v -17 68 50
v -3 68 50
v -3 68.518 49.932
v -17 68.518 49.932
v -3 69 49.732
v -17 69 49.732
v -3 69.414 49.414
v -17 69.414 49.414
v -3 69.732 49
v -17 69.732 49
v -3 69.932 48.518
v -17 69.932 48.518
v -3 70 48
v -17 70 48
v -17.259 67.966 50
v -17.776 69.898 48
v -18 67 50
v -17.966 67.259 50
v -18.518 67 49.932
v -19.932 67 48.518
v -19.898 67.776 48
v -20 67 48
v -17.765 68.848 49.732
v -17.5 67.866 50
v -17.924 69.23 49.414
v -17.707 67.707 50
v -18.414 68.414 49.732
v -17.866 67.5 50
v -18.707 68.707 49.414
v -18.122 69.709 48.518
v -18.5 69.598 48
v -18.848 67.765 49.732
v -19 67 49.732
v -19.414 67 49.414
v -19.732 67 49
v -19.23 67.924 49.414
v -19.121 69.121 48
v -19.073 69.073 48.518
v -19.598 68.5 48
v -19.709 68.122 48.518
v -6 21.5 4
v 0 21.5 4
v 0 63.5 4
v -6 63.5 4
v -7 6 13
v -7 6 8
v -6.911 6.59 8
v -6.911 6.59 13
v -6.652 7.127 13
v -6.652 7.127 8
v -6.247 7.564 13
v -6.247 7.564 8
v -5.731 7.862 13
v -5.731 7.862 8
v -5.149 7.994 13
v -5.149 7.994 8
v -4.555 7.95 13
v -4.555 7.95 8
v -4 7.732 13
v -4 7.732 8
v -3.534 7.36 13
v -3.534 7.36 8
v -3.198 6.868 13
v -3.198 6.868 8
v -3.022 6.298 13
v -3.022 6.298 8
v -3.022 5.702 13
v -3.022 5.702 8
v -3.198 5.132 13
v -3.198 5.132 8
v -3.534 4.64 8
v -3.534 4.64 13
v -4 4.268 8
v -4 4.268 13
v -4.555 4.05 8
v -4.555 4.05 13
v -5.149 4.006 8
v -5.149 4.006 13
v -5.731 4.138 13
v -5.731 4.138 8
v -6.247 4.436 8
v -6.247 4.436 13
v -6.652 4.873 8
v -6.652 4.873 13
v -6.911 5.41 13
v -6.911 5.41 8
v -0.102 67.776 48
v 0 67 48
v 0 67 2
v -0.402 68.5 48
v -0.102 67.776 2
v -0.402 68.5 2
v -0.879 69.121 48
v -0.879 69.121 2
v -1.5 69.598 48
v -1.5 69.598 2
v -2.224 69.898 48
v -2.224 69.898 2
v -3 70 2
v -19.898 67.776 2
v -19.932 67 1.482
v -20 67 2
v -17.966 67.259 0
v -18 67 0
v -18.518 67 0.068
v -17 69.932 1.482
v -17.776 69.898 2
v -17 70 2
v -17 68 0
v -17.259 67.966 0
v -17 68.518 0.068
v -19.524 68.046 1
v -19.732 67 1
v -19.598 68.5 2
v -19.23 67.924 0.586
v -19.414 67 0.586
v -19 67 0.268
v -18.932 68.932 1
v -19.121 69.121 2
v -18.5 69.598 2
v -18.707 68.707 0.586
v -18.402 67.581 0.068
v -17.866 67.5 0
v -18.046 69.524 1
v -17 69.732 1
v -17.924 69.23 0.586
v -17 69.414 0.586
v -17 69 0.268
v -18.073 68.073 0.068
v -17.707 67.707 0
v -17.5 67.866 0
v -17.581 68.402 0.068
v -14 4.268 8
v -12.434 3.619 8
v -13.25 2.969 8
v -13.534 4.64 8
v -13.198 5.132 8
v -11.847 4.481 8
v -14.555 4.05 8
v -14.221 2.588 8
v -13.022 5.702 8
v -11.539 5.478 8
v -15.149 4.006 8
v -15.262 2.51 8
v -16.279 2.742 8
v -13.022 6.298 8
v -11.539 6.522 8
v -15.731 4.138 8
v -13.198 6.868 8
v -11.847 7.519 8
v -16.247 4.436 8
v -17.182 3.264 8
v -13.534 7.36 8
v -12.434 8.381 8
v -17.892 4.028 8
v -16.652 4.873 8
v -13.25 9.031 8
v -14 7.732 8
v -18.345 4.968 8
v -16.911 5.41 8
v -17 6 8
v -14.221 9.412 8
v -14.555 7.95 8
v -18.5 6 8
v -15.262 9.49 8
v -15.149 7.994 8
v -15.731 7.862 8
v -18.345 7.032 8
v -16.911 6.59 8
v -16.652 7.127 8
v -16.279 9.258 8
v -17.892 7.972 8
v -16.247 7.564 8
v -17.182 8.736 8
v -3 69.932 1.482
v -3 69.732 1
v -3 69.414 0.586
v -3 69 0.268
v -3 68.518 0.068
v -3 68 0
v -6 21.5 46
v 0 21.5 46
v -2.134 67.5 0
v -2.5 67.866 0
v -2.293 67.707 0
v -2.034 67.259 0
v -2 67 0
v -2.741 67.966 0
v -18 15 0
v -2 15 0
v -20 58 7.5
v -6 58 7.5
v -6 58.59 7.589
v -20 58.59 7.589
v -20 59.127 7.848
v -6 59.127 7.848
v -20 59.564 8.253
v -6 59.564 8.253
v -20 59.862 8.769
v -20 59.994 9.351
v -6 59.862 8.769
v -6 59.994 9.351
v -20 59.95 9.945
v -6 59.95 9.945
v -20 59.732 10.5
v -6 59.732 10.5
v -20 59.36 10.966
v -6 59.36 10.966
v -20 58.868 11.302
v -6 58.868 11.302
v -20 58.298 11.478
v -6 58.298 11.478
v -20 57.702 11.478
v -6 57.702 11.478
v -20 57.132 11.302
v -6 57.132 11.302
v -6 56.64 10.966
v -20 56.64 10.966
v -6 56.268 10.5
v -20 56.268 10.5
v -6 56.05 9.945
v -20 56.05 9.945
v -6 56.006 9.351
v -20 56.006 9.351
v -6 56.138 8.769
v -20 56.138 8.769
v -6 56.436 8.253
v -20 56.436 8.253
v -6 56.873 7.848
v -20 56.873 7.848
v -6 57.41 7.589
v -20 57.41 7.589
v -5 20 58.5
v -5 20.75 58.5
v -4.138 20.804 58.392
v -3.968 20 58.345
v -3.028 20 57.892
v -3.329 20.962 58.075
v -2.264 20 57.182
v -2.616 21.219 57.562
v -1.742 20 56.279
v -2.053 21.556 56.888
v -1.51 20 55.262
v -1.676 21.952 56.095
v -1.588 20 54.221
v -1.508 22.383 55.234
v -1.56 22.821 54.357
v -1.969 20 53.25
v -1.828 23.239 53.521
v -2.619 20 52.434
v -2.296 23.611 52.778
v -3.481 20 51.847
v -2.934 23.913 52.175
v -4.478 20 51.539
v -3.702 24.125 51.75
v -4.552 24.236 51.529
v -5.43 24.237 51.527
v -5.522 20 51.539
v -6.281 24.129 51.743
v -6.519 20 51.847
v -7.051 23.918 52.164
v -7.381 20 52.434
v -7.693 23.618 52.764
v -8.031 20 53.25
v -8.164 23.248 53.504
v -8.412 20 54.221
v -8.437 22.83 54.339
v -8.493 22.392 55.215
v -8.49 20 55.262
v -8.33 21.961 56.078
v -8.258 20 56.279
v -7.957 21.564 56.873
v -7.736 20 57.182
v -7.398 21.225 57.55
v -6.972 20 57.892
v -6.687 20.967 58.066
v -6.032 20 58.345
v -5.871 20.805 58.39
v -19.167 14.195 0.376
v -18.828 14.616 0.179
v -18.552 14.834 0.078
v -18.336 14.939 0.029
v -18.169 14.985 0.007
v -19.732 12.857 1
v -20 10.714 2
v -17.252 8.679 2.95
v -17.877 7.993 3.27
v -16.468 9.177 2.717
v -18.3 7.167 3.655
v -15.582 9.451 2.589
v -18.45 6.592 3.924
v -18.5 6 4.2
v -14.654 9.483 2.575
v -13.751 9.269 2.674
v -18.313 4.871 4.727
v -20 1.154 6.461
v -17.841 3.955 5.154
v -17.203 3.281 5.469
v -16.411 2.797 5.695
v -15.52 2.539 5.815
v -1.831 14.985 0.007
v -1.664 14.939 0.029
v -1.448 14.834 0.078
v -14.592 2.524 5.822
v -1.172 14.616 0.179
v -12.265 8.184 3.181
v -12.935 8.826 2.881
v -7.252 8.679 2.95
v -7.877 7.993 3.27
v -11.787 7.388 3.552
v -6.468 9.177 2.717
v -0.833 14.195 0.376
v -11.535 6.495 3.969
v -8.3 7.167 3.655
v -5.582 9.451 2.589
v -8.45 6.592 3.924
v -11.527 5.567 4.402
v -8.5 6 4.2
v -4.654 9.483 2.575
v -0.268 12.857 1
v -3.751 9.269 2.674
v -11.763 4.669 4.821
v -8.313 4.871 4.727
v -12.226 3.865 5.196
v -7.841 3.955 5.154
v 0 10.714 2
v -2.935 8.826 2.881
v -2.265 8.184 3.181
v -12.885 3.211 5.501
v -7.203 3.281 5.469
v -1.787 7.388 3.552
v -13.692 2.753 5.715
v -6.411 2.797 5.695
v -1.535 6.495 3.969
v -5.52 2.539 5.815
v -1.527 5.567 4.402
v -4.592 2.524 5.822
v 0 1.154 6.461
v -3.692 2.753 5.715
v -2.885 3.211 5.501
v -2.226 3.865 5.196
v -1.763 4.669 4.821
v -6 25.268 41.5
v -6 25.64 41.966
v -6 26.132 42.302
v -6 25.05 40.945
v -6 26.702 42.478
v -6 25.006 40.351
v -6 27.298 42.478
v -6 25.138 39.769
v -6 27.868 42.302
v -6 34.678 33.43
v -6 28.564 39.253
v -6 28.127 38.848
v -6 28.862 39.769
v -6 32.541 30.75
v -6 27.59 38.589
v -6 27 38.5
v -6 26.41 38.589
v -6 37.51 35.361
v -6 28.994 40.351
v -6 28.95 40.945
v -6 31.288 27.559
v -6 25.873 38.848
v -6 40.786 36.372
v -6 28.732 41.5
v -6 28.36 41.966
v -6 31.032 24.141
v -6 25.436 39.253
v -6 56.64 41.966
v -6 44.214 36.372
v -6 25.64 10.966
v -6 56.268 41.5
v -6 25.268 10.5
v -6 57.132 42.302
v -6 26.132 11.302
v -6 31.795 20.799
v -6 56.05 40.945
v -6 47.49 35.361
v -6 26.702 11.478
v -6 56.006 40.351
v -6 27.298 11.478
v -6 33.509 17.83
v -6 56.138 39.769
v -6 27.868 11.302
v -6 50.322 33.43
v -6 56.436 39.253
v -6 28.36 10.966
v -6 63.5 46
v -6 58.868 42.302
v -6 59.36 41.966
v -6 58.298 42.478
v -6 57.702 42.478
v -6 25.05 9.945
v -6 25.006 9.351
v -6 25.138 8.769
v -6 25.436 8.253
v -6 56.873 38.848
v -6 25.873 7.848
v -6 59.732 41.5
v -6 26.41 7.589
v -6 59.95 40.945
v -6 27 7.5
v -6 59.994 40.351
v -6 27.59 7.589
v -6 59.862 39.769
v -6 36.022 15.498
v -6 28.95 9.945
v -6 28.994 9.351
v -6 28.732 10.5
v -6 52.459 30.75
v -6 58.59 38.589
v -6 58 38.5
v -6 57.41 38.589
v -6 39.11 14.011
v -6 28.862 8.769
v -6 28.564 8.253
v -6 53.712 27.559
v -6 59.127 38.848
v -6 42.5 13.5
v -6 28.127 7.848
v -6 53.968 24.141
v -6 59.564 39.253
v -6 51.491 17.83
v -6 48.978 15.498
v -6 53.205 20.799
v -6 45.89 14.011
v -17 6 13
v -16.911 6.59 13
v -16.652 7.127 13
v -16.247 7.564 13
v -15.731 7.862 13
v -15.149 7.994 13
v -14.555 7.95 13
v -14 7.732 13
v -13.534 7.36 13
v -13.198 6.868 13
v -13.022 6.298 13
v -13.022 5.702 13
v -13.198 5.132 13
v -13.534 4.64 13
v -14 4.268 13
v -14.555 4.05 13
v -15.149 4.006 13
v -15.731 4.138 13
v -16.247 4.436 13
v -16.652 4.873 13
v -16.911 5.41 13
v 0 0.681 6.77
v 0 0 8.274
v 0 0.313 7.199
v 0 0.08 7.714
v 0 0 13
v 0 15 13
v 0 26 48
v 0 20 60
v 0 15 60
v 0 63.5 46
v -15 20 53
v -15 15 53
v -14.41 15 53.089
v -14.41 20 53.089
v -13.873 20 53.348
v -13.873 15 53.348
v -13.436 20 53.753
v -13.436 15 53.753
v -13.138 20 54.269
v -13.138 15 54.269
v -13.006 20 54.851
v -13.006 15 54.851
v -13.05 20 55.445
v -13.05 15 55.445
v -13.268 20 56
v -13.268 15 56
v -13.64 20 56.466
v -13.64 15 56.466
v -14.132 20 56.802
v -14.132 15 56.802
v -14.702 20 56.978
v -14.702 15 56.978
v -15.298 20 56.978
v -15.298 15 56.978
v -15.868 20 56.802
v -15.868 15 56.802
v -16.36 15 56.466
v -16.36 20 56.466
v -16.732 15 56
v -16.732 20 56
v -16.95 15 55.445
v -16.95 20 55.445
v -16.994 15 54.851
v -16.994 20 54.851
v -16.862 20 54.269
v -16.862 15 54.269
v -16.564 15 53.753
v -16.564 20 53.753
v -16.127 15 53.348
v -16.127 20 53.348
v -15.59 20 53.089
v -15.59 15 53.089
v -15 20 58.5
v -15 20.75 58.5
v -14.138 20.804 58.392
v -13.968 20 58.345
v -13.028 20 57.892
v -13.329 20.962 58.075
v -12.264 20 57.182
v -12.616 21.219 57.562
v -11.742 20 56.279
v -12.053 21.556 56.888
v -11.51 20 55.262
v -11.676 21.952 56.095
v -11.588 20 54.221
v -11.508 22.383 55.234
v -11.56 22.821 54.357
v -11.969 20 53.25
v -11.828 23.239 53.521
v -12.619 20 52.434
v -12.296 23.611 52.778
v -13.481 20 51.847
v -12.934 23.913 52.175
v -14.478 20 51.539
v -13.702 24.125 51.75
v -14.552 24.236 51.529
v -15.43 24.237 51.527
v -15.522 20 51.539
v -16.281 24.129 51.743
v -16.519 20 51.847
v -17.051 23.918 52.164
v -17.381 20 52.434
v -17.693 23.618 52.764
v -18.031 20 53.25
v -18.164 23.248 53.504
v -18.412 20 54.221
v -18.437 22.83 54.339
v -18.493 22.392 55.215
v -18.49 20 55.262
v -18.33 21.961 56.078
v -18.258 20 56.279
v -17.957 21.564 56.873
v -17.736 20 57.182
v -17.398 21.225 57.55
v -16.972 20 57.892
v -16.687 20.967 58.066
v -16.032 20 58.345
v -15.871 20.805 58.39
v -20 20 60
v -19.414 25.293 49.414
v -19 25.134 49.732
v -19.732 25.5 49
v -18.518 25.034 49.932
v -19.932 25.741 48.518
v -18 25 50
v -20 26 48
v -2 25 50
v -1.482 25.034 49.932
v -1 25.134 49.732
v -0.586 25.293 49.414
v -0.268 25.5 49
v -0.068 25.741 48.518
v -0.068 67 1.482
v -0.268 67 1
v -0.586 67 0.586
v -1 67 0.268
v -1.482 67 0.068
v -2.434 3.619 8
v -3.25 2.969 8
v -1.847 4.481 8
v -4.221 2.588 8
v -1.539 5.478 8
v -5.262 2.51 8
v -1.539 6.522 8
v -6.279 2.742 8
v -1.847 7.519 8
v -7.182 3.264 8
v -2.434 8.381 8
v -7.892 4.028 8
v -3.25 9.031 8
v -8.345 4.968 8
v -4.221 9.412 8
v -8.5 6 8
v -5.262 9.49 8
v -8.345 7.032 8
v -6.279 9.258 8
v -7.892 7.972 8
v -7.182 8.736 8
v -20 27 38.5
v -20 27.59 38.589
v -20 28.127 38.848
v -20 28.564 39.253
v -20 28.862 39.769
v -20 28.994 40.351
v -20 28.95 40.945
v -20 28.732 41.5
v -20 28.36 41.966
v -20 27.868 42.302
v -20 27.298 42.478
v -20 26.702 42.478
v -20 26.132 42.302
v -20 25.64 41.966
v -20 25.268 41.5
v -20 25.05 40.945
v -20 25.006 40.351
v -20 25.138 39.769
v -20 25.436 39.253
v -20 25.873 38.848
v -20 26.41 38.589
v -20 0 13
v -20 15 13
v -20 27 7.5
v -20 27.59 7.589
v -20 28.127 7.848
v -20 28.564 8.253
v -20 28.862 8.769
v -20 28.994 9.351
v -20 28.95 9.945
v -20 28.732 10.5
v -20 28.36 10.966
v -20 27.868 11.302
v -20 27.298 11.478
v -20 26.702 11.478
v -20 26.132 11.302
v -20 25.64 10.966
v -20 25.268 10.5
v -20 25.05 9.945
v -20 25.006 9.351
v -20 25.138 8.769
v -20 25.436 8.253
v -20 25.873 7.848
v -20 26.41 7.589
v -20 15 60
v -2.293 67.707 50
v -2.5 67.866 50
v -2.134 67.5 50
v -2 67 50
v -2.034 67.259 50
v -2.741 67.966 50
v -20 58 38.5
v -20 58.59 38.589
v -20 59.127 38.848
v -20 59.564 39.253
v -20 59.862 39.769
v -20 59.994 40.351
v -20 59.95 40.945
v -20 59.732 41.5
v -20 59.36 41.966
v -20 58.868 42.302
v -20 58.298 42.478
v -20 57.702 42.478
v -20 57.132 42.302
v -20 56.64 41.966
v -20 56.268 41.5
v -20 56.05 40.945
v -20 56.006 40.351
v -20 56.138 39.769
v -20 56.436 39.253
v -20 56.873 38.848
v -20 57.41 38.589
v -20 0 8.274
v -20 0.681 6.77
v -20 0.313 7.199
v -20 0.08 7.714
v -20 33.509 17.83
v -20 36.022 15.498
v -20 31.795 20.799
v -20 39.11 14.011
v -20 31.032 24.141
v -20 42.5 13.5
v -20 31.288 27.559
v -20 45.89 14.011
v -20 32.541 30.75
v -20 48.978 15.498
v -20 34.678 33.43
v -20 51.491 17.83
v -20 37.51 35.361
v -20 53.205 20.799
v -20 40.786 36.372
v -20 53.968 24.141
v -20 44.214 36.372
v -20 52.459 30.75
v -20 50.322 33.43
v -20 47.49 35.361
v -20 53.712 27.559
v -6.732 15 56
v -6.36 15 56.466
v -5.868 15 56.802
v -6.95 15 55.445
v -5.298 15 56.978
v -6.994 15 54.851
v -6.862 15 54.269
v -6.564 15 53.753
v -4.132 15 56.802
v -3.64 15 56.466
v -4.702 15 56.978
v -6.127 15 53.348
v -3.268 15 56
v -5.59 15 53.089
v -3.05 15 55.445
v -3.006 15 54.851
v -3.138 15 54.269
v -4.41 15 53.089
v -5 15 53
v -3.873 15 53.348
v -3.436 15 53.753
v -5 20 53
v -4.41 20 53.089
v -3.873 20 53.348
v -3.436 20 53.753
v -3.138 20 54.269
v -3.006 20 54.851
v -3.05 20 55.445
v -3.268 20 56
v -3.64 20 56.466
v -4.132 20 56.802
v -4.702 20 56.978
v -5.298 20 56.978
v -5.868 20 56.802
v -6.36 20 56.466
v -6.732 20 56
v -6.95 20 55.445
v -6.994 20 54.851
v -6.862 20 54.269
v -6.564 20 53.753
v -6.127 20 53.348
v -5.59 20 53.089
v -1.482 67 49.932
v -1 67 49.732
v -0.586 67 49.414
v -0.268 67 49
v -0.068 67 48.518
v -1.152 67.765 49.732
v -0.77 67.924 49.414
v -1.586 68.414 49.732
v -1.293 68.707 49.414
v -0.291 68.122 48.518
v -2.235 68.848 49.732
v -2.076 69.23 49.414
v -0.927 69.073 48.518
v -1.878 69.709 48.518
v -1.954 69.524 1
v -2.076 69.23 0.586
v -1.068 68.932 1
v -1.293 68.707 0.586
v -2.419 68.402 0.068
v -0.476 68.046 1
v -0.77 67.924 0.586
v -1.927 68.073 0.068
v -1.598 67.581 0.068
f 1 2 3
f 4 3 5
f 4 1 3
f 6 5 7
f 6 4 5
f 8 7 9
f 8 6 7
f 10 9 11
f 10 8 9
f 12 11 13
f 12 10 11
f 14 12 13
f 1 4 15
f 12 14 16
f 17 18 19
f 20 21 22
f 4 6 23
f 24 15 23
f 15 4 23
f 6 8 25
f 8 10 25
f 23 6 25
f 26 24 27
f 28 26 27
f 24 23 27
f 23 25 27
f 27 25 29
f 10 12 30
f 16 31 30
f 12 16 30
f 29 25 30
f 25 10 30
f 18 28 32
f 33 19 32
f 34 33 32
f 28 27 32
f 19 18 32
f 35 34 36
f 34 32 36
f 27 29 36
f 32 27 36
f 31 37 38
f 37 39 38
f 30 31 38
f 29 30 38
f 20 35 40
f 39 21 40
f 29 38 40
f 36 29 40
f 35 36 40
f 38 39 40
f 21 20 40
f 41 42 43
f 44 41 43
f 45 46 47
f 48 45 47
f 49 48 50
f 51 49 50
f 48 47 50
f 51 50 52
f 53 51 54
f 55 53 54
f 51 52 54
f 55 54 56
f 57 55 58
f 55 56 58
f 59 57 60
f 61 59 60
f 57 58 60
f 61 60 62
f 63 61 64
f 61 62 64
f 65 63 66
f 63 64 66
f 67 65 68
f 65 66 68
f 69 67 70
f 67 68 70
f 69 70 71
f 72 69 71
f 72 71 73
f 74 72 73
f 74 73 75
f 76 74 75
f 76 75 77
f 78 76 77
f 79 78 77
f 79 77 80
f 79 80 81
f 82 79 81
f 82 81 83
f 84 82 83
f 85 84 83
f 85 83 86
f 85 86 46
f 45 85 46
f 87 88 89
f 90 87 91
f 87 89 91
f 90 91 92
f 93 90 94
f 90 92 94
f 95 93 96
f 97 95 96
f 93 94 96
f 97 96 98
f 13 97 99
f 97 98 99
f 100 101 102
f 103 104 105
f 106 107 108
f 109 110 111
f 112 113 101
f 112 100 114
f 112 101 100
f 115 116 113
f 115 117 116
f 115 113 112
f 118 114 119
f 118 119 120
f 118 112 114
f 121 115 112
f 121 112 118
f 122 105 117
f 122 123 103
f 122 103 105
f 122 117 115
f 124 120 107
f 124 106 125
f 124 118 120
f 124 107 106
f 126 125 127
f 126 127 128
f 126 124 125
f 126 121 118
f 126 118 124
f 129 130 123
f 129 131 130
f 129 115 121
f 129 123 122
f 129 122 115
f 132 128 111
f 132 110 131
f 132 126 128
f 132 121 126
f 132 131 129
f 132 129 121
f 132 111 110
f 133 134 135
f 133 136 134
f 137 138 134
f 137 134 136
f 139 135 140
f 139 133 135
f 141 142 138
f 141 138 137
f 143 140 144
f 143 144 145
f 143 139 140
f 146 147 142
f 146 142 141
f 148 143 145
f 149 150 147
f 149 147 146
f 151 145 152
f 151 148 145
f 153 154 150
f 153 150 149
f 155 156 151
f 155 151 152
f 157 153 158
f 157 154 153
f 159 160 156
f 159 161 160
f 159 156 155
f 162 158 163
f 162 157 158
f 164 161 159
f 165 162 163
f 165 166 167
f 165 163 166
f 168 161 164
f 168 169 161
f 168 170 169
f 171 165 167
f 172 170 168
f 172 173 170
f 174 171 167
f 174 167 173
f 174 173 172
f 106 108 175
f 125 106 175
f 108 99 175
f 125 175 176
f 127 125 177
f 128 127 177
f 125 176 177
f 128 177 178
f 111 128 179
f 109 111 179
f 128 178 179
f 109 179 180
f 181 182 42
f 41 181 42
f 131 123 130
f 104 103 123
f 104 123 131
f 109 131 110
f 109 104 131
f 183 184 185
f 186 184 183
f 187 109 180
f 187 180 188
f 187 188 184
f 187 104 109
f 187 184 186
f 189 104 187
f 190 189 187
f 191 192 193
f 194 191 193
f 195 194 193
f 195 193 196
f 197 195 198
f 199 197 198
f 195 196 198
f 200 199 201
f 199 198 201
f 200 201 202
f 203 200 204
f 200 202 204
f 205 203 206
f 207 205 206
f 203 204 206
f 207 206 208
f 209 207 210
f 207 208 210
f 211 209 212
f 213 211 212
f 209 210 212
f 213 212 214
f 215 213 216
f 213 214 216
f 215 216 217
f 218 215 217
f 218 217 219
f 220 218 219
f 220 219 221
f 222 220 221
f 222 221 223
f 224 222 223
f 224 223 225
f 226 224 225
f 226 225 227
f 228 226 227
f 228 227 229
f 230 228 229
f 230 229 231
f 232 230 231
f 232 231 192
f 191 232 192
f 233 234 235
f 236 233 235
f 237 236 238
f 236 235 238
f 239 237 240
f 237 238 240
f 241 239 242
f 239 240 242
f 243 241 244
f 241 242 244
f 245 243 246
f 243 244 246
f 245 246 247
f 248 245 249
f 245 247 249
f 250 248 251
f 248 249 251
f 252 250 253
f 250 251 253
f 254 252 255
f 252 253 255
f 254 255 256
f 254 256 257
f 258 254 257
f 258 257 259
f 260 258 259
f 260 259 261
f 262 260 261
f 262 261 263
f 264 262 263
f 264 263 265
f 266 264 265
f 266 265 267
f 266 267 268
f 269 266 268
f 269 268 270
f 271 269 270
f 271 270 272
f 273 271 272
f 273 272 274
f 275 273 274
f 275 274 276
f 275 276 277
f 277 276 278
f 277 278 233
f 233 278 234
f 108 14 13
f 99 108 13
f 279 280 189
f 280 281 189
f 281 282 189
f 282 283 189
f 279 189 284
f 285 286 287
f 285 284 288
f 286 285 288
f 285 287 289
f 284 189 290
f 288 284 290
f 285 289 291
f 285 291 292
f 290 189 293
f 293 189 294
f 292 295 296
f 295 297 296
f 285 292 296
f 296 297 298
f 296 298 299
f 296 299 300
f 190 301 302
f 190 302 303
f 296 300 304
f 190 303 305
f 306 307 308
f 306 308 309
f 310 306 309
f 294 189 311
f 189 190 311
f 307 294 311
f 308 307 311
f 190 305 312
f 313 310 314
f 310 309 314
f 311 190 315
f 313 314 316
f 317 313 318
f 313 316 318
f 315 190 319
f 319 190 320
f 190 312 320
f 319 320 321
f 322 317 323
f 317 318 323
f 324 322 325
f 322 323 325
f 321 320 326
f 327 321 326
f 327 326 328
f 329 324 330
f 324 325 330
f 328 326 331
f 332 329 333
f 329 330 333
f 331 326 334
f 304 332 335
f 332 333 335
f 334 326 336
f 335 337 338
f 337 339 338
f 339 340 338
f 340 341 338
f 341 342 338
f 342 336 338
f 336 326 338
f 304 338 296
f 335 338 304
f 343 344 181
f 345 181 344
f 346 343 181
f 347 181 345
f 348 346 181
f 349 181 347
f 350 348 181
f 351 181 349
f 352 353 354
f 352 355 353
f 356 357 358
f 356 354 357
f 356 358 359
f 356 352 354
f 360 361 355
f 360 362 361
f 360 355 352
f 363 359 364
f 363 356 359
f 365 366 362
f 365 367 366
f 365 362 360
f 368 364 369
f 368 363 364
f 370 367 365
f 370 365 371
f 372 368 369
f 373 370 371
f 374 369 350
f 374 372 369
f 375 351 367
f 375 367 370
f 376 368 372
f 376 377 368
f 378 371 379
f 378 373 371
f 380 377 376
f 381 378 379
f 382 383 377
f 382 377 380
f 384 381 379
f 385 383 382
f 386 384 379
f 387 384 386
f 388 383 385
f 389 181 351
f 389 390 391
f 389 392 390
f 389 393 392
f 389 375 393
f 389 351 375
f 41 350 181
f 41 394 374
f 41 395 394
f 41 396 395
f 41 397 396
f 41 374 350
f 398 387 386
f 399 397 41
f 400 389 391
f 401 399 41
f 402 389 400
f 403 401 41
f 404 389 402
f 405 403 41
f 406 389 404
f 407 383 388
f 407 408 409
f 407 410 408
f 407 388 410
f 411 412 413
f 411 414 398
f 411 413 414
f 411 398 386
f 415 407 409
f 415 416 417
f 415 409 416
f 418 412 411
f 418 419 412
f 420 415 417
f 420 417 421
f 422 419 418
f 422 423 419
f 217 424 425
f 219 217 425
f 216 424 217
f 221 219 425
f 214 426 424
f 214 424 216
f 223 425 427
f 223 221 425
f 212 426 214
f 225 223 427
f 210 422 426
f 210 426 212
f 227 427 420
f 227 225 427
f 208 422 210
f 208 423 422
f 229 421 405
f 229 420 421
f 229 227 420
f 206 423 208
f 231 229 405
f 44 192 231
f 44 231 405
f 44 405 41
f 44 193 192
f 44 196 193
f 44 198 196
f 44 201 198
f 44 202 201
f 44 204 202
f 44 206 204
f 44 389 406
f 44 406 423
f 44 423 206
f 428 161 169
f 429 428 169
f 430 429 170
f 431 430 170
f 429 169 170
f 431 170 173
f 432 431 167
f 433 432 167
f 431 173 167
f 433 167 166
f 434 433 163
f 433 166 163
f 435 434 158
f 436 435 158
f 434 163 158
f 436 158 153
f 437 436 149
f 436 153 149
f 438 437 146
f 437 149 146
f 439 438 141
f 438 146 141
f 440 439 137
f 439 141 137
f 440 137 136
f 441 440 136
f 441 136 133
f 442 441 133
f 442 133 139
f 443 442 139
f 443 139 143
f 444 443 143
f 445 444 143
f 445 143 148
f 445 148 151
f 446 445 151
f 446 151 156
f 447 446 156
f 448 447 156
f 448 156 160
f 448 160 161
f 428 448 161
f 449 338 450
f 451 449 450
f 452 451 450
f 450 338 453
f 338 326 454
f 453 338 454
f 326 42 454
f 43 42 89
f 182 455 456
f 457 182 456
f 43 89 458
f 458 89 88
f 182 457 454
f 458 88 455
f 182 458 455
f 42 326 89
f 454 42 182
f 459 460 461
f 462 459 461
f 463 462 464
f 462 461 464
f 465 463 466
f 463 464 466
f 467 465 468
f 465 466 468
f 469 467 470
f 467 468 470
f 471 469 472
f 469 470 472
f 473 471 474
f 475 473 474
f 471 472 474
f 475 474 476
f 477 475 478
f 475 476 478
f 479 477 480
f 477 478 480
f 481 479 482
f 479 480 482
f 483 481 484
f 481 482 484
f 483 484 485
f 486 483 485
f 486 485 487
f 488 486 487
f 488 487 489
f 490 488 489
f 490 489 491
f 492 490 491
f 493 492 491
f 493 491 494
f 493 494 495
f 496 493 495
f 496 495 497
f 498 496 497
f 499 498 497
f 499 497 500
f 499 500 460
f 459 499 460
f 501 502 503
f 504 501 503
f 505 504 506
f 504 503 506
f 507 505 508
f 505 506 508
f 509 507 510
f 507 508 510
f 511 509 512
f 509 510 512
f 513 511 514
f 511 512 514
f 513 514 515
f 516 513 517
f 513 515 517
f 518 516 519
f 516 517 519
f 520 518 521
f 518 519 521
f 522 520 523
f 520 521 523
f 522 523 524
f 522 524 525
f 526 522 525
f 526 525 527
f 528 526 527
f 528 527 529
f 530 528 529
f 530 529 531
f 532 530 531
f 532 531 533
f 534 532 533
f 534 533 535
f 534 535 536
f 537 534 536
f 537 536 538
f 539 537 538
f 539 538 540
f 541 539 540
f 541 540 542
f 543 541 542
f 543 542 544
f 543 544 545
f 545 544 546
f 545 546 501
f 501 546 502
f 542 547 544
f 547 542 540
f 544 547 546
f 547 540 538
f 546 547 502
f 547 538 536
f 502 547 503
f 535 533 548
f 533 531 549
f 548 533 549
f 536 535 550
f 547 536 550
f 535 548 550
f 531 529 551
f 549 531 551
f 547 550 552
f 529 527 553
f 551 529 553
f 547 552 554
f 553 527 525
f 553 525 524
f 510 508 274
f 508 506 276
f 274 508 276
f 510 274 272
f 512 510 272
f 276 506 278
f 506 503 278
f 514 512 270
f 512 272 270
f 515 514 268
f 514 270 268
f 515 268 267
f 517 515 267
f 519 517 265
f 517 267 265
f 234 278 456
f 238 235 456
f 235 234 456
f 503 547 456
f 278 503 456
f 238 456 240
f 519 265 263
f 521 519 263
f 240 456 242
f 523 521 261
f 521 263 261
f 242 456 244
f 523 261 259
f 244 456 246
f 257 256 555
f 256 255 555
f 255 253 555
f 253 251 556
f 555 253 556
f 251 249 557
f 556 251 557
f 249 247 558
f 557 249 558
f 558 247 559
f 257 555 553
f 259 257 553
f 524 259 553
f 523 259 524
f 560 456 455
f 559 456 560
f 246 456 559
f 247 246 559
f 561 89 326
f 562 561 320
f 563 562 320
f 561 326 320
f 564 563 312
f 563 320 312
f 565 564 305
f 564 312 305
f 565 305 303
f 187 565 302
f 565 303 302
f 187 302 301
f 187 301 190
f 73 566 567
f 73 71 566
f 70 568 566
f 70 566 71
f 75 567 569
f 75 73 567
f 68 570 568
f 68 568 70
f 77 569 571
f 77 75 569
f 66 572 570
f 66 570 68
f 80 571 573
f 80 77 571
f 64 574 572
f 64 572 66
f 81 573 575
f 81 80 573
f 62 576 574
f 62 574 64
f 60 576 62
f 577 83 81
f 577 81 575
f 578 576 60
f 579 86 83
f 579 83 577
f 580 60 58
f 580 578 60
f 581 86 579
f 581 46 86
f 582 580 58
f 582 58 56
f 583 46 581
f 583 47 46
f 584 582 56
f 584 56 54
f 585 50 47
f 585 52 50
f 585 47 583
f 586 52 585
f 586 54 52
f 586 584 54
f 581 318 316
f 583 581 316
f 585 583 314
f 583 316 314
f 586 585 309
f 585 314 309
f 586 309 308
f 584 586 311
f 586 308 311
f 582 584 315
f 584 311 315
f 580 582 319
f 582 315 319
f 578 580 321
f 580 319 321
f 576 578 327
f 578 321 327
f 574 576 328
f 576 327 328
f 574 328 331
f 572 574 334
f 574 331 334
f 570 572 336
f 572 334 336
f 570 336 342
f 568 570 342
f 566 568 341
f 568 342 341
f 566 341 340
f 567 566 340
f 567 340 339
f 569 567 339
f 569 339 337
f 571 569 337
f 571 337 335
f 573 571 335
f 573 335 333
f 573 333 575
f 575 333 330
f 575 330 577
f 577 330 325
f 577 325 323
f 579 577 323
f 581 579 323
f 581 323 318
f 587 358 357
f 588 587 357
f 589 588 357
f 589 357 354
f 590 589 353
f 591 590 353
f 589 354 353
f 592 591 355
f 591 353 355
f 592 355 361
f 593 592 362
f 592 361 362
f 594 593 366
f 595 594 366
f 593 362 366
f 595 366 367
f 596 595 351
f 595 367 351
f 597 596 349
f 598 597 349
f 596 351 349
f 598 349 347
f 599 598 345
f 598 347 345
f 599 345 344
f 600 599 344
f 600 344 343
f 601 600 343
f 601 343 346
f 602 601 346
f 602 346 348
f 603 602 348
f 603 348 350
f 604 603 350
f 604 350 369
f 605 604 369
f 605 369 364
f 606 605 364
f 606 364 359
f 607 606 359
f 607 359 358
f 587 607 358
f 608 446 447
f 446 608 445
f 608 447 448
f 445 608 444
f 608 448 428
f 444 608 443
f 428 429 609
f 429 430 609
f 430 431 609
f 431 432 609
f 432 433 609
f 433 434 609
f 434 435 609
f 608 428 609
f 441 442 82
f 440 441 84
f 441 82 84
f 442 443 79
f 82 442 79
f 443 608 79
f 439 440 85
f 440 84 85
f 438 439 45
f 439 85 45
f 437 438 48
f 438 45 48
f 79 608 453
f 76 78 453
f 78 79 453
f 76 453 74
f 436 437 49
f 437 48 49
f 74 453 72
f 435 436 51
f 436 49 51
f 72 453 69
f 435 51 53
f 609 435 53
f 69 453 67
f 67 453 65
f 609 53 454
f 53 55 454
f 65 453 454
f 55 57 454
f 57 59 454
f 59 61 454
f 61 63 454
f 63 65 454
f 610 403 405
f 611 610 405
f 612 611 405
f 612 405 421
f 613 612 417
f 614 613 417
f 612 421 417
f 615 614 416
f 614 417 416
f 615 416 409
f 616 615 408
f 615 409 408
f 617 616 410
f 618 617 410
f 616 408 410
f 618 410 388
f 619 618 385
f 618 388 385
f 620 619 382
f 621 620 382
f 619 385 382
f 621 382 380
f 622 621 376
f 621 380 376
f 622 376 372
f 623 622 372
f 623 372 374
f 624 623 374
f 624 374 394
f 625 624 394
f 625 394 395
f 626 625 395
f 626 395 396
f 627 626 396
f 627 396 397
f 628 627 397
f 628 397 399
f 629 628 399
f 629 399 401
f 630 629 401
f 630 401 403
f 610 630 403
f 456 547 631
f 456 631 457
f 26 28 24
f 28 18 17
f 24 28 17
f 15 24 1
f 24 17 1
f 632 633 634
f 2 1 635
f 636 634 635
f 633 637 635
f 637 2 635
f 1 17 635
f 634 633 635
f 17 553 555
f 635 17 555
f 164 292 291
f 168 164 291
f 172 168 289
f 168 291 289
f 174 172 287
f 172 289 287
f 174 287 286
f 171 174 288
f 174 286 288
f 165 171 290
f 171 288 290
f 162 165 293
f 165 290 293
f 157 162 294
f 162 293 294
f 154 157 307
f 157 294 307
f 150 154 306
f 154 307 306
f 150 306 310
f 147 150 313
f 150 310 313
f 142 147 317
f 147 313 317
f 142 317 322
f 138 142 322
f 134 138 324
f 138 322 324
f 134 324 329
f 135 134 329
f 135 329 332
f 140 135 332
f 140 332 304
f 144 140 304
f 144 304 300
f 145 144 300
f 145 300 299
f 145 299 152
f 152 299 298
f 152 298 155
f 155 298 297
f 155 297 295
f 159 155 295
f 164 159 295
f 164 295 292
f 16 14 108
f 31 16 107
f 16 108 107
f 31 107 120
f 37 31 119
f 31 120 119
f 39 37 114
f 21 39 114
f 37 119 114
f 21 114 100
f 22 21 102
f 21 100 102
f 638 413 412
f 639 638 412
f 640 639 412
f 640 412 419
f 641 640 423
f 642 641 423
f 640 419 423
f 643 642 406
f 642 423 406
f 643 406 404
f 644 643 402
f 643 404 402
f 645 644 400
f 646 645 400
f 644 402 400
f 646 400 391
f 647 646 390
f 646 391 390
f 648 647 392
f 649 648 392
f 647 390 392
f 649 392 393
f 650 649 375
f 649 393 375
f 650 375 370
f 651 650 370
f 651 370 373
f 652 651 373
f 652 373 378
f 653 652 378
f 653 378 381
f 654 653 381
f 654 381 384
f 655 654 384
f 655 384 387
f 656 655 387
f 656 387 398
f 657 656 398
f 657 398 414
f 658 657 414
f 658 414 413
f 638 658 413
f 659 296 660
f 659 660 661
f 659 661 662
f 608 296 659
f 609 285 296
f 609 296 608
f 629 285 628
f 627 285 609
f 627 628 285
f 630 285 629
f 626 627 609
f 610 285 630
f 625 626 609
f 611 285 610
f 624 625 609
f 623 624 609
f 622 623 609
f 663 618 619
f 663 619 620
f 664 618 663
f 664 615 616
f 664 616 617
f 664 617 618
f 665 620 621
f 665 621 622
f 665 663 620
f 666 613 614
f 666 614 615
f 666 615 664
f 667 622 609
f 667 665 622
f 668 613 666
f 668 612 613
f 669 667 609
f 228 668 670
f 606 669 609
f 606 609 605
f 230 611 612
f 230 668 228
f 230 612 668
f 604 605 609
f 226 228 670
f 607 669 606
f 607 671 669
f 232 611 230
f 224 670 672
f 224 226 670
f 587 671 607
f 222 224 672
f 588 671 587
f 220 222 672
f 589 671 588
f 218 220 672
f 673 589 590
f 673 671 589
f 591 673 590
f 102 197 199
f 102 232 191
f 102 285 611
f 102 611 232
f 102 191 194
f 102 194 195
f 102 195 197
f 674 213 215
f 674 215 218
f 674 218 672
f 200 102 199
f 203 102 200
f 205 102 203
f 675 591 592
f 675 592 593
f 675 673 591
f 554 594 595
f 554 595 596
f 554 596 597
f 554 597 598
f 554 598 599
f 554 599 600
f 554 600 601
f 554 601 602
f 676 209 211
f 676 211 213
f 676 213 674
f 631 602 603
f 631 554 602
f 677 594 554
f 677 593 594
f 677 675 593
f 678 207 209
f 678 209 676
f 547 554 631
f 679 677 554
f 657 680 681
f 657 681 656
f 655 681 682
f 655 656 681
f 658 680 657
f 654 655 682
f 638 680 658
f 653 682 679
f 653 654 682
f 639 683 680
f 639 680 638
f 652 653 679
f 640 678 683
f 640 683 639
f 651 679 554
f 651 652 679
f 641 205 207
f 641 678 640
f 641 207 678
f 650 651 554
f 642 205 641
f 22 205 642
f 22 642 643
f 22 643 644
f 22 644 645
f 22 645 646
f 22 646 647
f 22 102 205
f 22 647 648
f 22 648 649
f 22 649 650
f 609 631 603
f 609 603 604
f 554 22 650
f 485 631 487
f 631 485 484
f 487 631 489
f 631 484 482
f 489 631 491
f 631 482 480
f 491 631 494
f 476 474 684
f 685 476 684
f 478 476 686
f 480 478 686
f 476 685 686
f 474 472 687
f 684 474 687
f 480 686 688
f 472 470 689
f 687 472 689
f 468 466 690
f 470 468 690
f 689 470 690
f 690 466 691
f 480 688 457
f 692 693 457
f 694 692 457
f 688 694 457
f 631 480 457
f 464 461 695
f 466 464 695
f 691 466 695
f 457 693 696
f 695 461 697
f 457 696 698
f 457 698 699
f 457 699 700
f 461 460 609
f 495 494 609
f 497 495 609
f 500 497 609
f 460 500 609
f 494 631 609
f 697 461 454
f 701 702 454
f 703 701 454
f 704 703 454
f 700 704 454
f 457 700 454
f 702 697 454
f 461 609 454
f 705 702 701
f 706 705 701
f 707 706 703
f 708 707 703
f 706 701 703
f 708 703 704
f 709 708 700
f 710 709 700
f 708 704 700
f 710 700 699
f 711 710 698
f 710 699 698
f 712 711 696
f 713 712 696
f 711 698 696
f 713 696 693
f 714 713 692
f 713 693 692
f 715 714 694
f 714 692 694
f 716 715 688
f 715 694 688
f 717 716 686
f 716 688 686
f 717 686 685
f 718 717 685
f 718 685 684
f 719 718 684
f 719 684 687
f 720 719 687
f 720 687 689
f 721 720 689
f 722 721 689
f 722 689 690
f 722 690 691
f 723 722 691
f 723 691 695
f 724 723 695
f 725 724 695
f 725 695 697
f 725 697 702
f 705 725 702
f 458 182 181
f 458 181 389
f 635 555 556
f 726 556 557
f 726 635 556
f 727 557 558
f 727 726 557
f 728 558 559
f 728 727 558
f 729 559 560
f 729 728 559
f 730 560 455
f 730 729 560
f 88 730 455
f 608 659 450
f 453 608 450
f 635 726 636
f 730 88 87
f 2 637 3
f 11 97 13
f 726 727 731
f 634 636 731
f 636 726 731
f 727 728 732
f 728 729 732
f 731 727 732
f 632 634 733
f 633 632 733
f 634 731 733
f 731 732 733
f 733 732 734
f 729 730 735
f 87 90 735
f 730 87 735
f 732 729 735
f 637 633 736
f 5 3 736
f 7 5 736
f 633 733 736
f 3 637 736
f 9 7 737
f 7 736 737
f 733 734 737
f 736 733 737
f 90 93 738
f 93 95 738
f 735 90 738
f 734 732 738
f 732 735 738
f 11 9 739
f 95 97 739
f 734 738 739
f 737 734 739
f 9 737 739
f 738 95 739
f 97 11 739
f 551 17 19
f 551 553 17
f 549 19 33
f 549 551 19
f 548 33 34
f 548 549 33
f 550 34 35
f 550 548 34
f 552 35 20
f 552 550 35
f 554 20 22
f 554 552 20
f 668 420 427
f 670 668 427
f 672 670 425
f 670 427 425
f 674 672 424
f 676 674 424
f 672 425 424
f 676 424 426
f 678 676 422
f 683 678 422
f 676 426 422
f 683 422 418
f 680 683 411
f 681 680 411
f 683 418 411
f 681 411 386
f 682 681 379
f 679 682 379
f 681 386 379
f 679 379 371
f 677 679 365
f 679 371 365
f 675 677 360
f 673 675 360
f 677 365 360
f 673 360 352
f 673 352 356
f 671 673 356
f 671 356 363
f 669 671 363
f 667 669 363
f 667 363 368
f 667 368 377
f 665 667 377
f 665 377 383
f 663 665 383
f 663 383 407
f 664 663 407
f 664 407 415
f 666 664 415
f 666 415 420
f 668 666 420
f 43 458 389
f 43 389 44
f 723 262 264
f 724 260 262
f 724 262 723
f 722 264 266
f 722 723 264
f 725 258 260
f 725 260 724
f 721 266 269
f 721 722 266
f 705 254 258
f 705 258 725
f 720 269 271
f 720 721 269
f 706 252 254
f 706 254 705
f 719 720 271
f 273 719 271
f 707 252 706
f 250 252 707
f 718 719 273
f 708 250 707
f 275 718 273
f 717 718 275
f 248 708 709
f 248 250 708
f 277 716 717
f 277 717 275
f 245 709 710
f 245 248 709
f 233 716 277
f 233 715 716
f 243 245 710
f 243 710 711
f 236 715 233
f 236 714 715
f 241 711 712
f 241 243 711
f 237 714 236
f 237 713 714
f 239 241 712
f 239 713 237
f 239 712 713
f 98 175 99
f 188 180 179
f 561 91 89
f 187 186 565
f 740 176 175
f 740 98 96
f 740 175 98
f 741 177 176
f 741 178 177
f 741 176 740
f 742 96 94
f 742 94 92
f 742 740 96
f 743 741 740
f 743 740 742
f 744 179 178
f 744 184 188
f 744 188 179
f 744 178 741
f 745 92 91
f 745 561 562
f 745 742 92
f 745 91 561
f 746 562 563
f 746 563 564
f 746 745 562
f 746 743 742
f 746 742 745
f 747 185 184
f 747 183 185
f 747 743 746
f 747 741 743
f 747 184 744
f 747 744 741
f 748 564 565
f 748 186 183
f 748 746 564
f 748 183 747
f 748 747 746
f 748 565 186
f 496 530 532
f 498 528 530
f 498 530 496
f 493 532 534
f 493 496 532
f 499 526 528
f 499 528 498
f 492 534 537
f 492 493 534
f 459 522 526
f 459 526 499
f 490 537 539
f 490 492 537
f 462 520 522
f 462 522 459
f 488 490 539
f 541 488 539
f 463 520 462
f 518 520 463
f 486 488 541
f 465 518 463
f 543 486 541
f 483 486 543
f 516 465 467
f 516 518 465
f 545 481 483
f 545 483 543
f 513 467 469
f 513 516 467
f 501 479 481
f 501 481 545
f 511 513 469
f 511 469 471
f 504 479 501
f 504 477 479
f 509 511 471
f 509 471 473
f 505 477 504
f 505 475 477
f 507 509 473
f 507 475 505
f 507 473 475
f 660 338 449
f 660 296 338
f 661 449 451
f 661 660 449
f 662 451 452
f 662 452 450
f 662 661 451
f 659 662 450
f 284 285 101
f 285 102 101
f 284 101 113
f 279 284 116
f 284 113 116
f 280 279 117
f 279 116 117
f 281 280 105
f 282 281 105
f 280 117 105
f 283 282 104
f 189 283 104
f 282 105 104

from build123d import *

# Parameters (mm, degrees)
SKETCH1_W           = 20
SKETCH1_H           = 50
BOSS_EXTRUDE1_DEPTH = 70
SKETCH2_R           = 2
SKETCH2_R_2         = 11.5
CUT_EXTRUDE2_DEPTH  = 60
SKETCH4_W           = 37
SKETCH4_H           = 15
CUT_EXTRUDE3_DEPTH  = 60
SKETCH8_R           = 2
CUT_EXTRUDE5_DEPTH  = 15
SKETCH9_W           = 42
SKETCH9_H           = 42
CUT_EXTRUDE6_DEPTH  = 6
CUT_EXTRUDE8_DEPTH  = 30
SKETCH12_W          = 20
SKETCH12_H          = 5
BOSS_EXTRUDE2_DEPTH = 10
BOSS_EXTRUDE3_DEPTH = 20
SKETCH15_R          = 2
CUT_EXTRUDE9_DEPTH  = 10
SKETCH17_R          = 3.5
CUT_EXTRUDE11_DEPTH = 8
SKETCH18_R          = 3.5
CUT_EXTRUDE12_DEPTH = 50
FILLET2_R           = 3
FILLET3_R           = 3
FILLET4_R           = 2
FILLET5_R           = 2
FILLET6_R           = 2


with BuildPart() as part:
    # Sketch1 → Boss-Extrude1 (new body)
    with BuildSketch(Plane(origin=(0, 0, 0), x_dir=(1, 0, 0), z_dir=(0, 1, 0))):
        with Locations((-10, -25)):
            Rectangle(SKETCH1_W, SKETCH1_H)
    extrude(amount=BOSS_EXTRUDE1_DEPTH)

    # Sketch2 → Cut-Extrude2 (cut)
    with BuildSketch(Plane(origin=(0, 0, 0), x_dir=(0, 0, -1), z_dir=(1, 0, 0))):
        with Locations((-9.5, 58)):
            Circle(SKETCH2_R)
        with Locations((-25, 42.5)):
            Circle(SKETCH2_R_2)
        with Locations((-9.5, 27)):
            Circle(SKETCH2_R)
        with Locations((-40.5, 27)):
            Circle(SKETCH2_R)
        with Locations((-40.5, 58)):
            Circle(SKETCH2_R)
    extrude(amount=-CUT_EXTRUDE2_DEPTH, mode=Mode.SUBTRACT)

    # Sketch4 → Cut-Extrude3 (cut)
    with BuildSketch(Plane(origin=(0, 0, 0), x_dir=(0, 0, -1), z_dir=(1, 0, 0))):
        with Locations((-31.5, 7.5)):
            Rectangle(SKETCH4_W, SKETCH4_H)
    extrude(amount=-CUT_EXTRUDE3_DEPTH, mode=Mode.SUBTRACT)

    # Sketch8 → Cut-Extrude5 (cut)
    with BuildSketch(Plane(origin=(0, 0, 0), x_dir=(-1, 0, 0), z_dir=(0, 0, -1))):
        with Locations((15, 6)):
            Circle(SKETCH8_R)
        with Locations((5, 6)):
            Circle(SKETCH8_R)
    extrude(amount=-CUT_EXTRUDE5_DEPTH, mode=Mode.SUBTRACT)

    # Sketch9 → Cut-Extrude6 (cut)
    with BuildSketch(Plane(origin=(0, 0, 0), x_dir=(0, 0, -1), z_dir=(1, 0, 0))):
        with Locations((-25, 42.5)):
            Rectangle(SKETCH9_W, SKETCH9_H)
    extrude(amount=-CUT_EXTRUDE6_DEPTH, mode=Mode.SUBTRACT)

    # Sketch11 → Cut-Extrude8 (cut)
    with BuildSketch(Plane(origin=(0, 0, 0), x_dir=(0, 0, -1), z_dir=(1, 0, 0))):
        Polygon((-7, 0), (0, 0), (0, 15), align=None)
    extrude(amount=-CUT_EXTRUDE8_DEPTH, mode=Mode.SUBTRACT)

    # Sketch12 → Boss-Extrude2 (add)
    with BuildSketch(Plane.XY.offset(50)):
        with Locations((-10, 17.5)):
            Rectangle(SKETCH12_W, SKETCH12_H)
    extrude(amount=BOSS_EXTRUDE2_DEPTH)

    # Sketch14 → Boss-Extrude3 (add)
    with BuildSketch(Plane(origin=(0, 0, 0), x_dir=(0, 0, -1), z_dir=(1, 0, 0))):
        Polygon((-50, 20), (-60, 20), (-50, 25), align=None)
    extrude(amount=-BOSS_EXTRUDE3_DEPTH)

    # Sketch15 → Cut-Extrude9 (cut)
    with BuildSketch(Plane(origin=(0, 15, 0), x_dir=(-1, 0, 0), z_dir=(0, -1, 0))):
        with Locations(Location((5, -55, 0), (0, 0, 90))):
            Circle(SKETCH15_R)
        with Locations(Location((15, -55, 0), (0, 0, 90))):
            Circle(SKETCH15_R)
    extrude(amount=-CUT_EXTRUDE9_DEPTH, mode=Mode.SUBTRACT)

    # Sketch17 → Cut-Extrude11 (cut)
    with BuildSketch(Plane(origin=(0, 0, 0), x_dir=(-1, 0, 0), z_dir=(0, 0, -1))):
        with Locations((15, 6)):
            Circle(SKETCH17_R)
        with Locations((5, 6)):
            Circle(SKETCH17_R)
    extrude(amount=-CUT_EXTRUDE11_DEPTH, mode=Mode.SUBTRACT)

    # Sketch18 → Cut-Extrude12 (cut)
    with BuildSketch(Plane(origin=(0, 70, 0), x_dir=(1, 0, 0), z_dir=(0, 1, 0))):
        with Locations(Location((-15, -55, 0), (0, 0, 270))):
            Circle(SKETCH18_R)
        with Locations(Location((-5, -55, 0), (0, 0, 270))):
            Circle(SKETCH18_R)
    extrude(amount=-CUT_EXTRUDE12_DEPTH, mode=Mode.SUBTRACT)

    # Fillet2
    fillet2_edges = [part.edges().sort_by_distance(p)[0] for p in [
        (0, 70, 25),
    ]]
    fillet(fillet2_edges, radius=FILLET2_R)

    # Fillet3
    fillet3_edges = [part.edges().sort_by_distance(p)[0] for p in [
        (-20, 70, 25),
    ]]
    fillet(fillet3_edges, radius=FILLET3_R)

    # Fillet4
    fillet4_edges = [part.edges().sort_by_distance(p)[0] for p in [
        (0, 46, 50),
        (-0.878679656, 69.121320344, 50),
        (-10, 70, 50),
        (-20, 46, 50),
        (-19.121320344, 69.121320344, 50),
    ]]
    fillet(fillet4_edges, radius=FILLET4_R)

    # Fillet5
    fillet5_edges = [part.edges().sort_by_distance(p)[0] for p in [
        (-10, 70, 0),
        (0, 41, 0),
        (-0.878679656, 69.121320344, 0),
        (-20, 41, 0),
        (-19.121320344, 69.121320344, 0),
    ]]
    fillet(fillet5_edges, radius=FILLET5_R)

    # Fillet6
    fillet6_edges = [part.edges().sort_by_distance(p)[0] for p in [
        (-10, 0, 7),
    ]]
    fillet(fillet6_edges, radius=FILLET6_R)


solid = part.part
